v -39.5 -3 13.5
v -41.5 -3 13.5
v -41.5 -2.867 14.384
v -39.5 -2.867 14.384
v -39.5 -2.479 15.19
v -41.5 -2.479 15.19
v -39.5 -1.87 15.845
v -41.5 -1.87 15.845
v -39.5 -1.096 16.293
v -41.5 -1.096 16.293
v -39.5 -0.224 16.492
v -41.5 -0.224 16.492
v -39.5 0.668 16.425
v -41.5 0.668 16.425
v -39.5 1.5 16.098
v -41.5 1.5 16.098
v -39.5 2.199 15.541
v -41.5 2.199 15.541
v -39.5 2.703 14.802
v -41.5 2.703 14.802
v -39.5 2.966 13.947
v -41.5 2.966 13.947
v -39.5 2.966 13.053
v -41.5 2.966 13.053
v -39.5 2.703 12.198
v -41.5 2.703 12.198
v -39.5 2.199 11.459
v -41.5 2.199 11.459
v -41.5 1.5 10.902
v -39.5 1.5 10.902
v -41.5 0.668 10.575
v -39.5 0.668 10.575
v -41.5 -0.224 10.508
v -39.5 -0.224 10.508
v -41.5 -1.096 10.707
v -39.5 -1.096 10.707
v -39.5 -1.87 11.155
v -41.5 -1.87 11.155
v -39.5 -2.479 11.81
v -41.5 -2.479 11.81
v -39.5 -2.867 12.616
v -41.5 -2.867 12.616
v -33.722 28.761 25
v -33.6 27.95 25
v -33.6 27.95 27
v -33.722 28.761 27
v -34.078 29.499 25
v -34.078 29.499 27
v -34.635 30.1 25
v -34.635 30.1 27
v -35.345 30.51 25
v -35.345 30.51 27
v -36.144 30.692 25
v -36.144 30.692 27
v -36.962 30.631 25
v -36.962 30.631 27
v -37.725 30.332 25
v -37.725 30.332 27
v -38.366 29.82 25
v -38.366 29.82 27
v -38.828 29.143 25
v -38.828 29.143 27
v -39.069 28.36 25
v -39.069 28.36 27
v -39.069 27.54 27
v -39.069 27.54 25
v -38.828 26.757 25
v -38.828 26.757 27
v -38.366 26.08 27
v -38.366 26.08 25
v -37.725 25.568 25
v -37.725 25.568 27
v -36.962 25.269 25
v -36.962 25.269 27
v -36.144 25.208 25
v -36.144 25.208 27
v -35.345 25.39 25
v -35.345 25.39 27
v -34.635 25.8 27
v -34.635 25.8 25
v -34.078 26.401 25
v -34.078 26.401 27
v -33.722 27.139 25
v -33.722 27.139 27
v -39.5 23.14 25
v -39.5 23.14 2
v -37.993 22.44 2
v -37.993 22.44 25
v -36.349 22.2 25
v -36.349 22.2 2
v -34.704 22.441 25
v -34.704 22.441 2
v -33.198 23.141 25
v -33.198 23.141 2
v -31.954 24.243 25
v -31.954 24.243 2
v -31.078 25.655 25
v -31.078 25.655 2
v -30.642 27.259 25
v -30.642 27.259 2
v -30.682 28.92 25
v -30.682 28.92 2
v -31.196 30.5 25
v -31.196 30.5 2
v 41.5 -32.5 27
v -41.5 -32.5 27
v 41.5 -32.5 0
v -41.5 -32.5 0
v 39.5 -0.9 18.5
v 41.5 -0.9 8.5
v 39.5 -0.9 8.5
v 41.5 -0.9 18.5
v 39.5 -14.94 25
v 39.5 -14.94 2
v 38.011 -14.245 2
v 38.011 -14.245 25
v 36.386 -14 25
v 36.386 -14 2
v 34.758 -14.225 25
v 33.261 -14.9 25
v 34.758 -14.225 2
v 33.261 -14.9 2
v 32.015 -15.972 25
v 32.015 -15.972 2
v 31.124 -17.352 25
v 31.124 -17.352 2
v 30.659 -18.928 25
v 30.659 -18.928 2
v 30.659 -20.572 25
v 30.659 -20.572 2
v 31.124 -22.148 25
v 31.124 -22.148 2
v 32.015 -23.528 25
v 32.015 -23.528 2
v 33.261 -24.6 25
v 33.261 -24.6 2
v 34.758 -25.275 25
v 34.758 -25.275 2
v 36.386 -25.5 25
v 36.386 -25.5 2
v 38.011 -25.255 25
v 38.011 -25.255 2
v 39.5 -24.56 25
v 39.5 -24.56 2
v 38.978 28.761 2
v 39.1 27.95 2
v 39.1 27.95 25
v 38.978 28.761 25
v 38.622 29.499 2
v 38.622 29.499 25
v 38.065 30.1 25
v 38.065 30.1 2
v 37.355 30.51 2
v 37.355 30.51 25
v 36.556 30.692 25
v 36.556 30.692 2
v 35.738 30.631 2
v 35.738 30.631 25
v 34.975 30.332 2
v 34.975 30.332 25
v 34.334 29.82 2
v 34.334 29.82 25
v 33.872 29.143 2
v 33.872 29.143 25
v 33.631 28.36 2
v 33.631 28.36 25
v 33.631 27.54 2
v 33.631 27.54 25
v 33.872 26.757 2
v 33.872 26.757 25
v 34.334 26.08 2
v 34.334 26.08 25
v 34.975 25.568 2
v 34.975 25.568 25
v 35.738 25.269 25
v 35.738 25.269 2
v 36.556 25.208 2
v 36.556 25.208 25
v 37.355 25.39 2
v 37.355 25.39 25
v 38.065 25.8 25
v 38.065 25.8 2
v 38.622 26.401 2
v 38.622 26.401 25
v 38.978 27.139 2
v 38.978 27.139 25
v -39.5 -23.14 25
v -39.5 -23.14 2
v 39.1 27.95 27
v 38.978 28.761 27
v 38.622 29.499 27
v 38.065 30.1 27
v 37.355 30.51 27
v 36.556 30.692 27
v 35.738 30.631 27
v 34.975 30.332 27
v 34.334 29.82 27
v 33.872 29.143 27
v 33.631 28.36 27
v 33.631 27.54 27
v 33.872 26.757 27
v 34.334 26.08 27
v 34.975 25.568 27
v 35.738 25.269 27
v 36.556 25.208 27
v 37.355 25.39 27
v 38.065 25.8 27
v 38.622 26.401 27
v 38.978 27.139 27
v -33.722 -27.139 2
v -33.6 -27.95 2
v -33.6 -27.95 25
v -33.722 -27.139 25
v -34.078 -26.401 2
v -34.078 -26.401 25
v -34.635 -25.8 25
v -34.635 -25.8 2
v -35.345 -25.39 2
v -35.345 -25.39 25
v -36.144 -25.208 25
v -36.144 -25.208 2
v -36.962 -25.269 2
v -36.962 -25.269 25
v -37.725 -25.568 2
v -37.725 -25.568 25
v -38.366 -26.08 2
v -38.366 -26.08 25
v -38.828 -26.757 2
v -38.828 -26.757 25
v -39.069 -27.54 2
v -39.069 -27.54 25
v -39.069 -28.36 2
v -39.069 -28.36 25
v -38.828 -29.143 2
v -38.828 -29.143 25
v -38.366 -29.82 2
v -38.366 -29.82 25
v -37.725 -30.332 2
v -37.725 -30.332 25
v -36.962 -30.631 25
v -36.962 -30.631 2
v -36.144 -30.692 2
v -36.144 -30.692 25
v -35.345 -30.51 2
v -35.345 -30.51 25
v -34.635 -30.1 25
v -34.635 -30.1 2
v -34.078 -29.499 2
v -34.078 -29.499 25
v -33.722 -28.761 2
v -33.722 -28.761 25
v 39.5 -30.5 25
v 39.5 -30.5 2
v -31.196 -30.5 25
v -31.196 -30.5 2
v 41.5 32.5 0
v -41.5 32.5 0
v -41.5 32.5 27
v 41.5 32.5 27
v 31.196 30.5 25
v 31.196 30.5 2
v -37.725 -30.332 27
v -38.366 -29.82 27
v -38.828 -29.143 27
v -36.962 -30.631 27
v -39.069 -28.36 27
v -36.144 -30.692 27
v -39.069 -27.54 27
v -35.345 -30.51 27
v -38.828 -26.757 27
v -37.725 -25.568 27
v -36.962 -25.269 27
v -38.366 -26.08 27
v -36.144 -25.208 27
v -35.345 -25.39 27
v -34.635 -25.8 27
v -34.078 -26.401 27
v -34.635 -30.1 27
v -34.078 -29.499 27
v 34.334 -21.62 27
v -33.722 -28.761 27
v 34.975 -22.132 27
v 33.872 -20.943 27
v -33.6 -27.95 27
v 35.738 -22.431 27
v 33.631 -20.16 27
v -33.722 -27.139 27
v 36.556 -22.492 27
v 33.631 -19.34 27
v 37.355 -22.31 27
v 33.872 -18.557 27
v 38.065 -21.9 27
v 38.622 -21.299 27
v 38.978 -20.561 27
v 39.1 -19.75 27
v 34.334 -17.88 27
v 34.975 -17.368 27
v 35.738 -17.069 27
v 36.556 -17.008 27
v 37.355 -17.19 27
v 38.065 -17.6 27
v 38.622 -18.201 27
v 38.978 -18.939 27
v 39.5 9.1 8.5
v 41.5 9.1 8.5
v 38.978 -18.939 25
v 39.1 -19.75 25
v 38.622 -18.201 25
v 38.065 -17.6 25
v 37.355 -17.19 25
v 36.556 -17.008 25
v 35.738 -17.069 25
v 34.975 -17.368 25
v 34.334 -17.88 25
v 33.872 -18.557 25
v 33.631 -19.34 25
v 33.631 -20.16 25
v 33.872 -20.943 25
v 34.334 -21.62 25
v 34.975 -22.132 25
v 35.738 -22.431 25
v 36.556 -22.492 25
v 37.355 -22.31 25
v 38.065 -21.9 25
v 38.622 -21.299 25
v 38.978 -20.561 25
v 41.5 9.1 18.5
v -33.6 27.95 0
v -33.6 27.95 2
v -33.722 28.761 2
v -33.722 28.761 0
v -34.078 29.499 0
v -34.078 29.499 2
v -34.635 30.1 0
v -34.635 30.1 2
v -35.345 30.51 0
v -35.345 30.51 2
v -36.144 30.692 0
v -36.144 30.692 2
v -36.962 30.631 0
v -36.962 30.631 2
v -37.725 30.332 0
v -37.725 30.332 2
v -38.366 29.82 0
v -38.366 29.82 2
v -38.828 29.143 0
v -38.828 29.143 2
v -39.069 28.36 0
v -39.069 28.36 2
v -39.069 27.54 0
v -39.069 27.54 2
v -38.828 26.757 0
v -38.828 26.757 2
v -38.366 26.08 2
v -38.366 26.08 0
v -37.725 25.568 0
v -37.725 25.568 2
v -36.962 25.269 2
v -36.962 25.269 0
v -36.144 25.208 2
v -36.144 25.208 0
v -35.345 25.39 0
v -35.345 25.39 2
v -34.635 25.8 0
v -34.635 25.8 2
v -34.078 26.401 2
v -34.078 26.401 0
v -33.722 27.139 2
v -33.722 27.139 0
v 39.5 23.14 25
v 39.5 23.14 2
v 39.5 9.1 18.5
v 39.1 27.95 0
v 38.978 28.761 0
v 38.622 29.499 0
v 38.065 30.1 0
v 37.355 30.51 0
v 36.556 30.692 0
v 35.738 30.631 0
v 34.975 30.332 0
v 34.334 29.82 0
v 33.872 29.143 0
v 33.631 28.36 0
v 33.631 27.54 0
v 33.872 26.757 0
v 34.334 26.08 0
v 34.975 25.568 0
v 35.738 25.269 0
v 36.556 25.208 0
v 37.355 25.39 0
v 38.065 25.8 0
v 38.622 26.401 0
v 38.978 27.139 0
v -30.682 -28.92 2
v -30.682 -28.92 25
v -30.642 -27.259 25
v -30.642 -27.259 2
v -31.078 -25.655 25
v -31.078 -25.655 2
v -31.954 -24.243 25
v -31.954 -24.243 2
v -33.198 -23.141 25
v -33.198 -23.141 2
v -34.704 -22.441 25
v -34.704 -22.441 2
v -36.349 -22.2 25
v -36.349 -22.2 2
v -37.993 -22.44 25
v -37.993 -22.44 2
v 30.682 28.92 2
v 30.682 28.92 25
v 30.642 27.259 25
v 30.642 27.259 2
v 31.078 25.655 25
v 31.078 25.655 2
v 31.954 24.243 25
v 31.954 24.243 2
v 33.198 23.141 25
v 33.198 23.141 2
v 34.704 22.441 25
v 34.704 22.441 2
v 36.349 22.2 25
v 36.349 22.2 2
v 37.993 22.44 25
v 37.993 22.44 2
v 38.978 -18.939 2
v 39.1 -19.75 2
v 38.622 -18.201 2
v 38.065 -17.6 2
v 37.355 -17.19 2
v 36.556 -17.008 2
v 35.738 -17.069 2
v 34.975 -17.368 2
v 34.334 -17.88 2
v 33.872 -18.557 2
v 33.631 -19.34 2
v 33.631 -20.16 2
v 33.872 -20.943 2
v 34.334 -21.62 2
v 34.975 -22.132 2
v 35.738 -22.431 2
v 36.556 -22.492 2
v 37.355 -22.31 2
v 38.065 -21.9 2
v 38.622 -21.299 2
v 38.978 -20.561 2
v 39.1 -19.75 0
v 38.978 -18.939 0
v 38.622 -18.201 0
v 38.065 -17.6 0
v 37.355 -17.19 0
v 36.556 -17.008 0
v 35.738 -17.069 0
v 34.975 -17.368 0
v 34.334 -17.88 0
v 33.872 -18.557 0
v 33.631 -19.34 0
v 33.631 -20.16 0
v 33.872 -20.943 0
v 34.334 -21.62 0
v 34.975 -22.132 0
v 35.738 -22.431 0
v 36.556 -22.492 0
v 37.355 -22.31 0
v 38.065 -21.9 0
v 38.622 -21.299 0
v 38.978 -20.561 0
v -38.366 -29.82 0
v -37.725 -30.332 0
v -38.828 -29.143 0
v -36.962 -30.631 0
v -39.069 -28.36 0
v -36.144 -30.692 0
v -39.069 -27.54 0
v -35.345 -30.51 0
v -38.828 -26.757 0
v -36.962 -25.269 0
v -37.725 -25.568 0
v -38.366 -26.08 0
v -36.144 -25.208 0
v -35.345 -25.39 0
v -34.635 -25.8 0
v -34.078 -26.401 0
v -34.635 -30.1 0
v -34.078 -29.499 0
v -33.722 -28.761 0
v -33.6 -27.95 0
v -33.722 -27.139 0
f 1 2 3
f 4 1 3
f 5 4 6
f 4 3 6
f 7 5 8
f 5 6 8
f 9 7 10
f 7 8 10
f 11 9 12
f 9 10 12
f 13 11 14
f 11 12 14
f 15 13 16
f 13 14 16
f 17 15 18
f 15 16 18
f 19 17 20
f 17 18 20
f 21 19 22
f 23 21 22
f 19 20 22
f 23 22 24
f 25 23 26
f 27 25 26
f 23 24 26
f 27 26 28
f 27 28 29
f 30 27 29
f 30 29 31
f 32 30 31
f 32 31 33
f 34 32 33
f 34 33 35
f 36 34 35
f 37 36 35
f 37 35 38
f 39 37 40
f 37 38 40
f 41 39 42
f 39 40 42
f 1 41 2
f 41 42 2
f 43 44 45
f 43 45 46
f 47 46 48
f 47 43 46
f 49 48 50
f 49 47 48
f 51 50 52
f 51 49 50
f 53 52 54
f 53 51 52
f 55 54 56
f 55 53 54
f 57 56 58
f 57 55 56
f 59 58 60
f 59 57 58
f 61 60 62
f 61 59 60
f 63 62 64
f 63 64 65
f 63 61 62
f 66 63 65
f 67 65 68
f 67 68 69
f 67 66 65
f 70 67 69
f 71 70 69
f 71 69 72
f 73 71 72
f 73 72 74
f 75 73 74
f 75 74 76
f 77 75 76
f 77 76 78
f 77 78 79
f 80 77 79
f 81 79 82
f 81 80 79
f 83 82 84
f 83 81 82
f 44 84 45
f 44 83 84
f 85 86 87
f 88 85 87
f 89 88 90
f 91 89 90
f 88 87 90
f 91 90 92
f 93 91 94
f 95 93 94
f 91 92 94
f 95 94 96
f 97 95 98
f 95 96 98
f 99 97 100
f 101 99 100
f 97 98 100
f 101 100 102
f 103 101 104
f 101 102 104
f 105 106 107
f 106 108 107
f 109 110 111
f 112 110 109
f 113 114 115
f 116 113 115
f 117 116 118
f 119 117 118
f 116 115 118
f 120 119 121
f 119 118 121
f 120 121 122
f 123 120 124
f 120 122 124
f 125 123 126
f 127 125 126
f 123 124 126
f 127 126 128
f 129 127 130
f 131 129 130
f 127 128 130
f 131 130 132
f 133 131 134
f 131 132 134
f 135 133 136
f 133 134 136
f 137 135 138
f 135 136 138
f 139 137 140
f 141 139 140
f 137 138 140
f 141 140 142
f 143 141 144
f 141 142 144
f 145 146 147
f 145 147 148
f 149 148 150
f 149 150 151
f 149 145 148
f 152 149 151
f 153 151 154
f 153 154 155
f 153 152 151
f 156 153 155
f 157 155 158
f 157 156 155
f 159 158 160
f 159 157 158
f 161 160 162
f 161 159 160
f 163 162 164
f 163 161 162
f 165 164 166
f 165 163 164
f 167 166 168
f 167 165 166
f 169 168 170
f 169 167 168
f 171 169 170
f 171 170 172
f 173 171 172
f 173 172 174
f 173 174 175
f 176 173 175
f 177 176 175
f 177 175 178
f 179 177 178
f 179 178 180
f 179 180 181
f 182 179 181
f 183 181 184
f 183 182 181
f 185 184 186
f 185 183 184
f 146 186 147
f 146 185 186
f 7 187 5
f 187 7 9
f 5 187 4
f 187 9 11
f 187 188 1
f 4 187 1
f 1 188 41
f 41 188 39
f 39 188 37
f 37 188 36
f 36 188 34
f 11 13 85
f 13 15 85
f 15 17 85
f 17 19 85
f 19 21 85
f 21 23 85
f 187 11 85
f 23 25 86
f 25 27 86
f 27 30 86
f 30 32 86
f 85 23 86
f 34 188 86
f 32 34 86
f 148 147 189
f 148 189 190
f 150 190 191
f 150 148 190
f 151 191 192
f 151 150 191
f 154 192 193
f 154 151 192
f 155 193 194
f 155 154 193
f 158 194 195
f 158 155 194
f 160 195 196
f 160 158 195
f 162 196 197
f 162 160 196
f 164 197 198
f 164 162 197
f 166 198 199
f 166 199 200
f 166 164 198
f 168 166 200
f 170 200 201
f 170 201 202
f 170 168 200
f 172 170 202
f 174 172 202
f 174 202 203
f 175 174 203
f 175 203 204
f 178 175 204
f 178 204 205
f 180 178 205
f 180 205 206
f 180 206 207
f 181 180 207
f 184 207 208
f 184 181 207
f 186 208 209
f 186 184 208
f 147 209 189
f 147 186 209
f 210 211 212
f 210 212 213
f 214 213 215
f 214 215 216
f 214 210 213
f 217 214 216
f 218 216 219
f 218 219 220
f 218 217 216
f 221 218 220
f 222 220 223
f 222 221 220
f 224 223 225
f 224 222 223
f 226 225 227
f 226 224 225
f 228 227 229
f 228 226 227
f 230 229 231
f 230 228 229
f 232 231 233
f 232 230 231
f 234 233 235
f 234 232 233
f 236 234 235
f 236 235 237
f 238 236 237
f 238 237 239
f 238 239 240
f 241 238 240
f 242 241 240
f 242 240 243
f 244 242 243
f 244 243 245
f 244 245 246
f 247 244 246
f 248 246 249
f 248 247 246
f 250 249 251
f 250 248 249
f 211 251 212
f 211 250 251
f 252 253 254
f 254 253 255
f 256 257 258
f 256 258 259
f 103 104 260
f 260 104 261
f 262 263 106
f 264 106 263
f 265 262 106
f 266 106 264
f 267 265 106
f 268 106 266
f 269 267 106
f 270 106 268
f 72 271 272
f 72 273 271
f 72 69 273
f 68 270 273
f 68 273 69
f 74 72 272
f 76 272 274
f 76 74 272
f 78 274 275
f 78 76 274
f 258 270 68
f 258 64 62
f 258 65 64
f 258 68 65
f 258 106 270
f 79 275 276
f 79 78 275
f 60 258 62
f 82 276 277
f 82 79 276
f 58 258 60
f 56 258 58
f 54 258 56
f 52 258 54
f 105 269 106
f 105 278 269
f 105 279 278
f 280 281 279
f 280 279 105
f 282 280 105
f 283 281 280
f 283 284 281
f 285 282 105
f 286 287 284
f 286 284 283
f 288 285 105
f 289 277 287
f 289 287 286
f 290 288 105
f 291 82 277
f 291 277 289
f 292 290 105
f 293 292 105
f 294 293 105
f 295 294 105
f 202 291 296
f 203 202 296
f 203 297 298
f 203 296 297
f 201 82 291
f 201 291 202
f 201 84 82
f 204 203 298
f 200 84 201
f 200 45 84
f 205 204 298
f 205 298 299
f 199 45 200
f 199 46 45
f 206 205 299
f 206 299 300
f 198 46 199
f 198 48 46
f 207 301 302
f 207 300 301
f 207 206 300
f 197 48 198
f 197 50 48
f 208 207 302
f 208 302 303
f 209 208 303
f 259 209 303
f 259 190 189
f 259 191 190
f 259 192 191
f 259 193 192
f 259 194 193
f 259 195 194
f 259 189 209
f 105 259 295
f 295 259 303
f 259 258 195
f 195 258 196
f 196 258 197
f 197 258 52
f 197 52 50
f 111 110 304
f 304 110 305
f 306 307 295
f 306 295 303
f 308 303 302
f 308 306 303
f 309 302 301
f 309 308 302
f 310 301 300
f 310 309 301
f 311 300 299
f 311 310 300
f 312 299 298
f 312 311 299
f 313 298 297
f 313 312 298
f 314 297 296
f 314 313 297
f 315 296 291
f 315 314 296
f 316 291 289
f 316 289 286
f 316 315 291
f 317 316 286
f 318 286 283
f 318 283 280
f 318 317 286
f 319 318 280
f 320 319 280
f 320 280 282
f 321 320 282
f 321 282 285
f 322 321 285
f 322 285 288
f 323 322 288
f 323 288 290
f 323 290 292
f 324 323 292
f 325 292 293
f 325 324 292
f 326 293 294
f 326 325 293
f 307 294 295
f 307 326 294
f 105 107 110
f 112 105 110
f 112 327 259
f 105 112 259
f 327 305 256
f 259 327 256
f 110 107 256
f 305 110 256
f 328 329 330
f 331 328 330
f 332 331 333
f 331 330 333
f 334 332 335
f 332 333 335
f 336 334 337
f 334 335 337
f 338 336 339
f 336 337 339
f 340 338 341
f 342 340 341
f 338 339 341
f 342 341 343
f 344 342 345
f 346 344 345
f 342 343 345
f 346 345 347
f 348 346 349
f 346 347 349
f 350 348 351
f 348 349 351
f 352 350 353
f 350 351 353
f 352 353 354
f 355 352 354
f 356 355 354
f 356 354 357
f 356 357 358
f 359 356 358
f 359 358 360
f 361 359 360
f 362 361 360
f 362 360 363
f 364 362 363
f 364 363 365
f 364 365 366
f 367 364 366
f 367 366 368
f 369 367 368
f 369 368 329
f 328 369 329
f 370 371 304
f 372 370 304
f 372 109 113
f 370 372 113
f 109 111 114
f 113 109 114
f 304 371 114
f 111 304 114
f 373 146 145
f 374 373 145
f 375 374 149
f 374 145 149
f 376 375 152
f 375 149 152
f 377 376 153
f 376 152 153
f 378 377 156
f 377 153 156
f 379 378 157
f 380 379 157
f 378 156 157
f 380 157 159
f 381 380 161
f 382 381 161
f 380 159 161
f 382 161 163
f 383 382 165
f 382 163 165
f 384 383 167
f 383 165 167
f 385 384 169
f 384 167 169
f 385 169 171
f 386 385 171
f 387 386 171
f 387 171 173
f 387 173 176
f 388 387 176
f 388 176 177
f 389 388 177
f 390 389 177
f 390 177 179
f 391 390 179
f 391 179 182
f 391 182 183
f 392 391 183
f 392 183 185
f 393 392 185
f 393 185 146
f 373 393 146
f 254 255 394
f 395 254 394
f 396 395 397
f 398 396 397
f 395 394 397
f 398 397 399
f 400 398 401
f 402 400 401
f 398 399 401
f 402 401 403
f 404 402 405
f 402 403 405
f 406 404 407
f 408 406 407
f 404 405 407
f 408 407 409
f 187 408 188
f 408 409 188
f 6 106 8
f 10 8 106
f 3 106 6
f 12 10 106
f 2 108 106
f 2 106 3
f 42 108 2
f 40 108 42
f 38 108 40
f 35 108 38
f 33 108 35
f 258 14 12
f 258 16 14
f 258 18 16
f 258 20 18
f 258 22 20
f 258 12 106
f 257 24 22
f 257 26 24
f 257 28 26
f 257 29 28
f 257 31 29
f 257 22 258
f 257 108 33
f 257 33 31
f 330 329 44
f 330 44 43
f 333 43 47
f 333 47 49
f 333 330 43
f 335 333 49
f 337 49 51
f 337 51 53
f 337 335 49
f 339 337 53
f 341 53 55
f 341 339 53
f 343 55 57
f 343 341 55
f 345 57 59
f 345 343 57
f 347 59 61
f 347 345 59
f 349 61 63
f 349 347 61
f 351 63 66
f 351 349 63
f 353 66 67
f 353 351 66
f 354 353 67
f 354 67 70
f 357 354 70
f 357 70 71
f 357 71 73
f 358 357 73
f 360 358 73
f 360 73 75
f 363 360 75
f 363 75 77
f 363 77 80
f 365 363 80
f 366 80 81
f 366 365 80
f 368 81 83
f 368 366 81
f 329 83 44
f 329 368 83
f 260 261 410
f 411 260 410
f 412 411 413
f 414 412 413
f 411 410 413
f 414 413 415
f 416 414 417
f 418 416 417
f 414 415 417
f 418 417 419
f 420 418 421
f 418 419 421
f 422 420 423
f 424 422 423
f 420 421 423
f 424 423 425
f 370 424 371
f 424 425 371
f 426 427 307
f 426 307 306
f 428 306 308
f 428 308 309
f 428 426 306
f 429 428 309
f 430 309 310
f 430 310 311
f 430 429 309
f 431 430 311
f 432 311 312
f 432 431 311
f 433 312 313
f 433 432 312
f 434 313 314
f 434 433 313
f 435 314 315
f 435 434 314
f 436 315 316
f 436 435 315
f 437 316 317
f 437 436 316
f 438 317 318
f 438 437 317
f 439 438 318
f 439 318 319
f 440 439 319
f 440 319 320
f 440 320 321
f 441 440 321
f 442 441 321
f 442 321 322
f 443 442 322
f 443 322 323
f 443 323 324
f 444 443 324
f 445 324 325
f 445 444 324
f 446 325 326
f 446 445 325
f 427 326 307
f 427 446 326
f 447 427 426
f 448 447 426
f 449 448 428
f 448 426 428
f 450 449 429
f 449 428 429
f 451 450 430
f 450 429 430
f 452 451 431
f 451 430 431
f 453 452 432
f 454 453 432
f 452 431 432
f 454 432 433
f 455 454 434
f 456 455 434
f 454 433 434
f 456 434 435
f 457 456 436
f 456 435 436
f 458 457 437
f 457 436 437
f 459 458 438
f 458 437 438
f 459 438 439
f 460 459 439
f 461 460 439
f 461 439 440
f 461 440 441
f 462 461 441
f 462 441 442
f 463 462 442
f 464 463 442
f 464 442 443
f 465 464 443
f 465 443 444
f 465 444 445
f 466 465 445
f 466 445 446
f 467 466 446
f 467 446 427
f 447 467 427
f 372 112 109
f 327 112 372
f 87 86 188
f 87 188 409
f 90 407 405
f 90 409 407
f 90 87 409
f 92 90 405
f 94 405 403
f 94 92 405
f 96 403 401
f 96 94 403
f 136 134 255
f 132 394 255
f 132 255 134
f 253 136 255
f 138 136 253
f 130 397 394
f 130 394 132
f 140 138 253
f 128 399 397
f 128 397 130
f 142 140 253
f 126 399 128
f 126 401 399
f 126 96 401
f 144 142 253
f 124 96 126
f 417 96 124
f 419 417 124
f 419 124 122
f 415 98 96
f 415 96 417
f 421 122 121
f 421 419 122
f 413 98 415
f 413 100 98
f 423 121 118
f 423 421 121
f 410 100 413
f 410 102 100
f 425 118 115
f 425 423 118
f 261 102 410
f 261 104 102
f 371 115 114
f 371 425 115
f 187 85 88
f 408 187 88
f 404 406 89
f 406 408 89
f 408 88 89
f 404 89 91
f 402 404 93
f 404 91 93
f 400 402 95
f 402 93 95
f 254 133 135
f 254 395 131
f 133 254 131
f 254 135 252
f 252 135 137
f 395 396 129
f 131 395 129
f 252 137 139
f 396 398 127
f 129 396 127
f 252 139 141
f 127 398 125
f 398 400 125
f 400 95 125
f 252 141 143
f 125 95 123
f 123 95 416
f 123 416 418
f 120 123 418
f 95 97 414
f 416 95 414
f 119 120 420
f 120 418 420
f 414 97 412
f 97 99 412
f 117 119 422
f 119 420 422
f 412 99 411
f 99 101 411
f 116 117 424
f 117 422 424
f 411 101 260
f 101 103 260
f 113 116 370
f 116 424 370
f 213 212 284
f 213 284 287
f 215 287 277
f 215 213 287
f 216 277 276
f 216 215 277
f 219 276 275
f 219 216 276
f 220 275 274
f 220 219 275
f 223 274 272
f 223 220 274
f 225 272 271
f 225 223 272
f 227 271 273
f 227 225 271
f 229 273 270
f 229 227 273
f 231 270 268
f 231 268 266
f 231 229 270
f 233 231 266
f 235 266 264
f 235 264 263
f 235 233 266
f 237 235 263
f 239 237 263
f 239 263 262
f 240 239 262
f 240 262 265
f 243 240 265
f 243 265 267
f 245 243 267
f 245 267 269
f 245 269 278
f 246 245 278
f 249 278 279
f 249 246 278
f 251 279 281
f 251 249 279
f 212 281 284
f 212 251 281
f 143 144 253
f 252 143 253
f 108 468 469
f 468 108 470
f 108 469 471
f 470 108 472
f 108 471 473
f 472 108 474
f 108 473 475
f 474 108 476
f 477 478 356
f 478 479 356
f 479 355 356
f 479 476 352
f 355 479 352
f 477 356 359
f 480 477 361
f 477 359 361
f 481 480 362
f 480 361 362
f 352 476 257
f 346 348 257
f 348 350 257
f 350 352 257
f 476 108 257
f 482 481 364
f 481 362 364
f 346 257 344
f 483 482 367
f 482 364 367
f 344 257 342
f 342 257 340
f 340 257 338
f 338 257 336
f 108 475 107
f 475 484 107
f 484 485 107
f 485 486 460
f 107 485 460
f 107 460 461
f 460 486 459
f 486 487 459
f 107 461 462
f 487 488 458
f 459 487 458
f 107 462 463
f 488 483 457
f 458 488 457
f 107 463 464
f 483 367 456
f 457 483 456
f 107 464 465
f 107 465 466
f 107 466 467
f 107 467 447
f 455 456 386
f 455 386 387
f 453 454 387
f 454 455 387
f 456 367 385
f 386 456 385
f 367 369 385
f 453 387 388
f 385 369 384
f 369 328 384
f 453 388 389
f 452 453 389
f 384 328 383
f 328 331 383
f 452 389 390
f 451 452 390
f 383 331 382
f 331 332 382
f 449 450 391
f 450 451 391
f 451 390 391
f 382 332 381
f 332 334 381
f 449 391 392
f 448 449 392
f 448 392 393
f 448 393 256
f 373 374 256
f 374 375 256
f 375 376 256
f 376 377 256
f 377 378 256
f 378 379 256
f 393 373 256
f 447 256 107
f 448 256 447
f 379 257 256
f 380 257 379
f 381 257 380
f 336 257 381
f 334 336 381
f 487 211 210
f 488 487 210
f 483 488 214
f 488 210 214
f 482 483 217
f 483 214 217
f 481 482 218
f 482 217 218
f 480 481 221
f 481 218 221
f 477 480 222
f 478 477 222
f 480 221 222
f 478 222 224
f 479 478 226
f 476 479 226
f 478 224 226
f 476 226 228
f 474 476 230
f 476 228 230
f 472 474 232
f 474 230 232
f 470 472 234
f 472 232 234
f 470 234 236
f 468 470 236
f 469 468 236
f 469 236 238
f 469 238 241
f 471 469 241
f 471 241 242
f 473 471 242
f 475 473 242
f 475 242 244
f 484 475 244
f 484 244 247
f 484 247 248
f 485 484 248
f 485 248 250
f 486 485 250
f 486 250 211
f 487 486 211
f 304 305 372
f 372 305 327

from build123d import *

# Parameters (mm, degrees)
F0_W      = 83
F0_H      = 65
F1_DEPTH  = 2
F2_W      = 83
F2_H      = 65
F2_R      = 2.75
F3_DEPTH  = 23
F4_R      = 2.75
F5_DEPTH  = 2.001
F6_W      = 83
F6_H      = 65
F6_R      = 2.75
F7_DEPTH  = 2
F8_W      = 10
F8_H      = 10
F9_DEPTH  = 2
F10_R     = 3
F11_DEPTH = 2


with BuildPart() as f1:
    # F0 (on Top) → F1 (new body)
    with BuildSketch(Plane.XY):
        Rectangle(F0_W, F0_H)
    extrude(amount=F1_DEPTH)

    # F2 (on face) → F3 (join)
    with BuildSketch(Plane.XY.offset(2)):
        Rectangle(F2_W, F2_H)
        with Locations((-36.35, -27.95)):
            Circle(F2_R, mode=Mode.SUBTRACT)
        with Locations((36.35, -19.75)):
            Circle(F2_R, mode=Mode.SUBTRACT)
        with Locations((-36.35, 27.95)):
            Circle(F2_R, mode=Mode.SUBTRACT)
        with BuildLine():
            Line((39.5, -30.5), (-31.196361, -30.5))
            ThreePointArc((-31.196361, -30.5), (-32.535877, -23.647098), (-39.5, -23.139595))
            Line((-39.5, -23.139595), (-39.5, 23.139595))
            ThreePointArc((-39.5, 23.139595), (-32.535877, 23.647098), (-31.196361, 30.5))
            Line((-31.196361, 30.5), (31.196361, 30.5))
            ThreePointArc((31.196361, 30.5), (32.535877, 23.647098), (39.5, 23.139595))
            Line((39.5, 23.139595), (39.5, -14.939595))
            ThreePointArc((39.5, -14.939595), (30.6, -19.75), (39.5, -24.560405))
            Line((39.5, -24.560405), (39.5, -30.5))
        make_face(mode=Mode.SUBTRACT)
        with Locations((36.35, 27.95)):
            Circle(F2_R, mode=Mode.SUBTRACT)
    extrude(amount=F3_DEPTH)

    # F4 (on face) → F5 (cut, through all)
    with BuildSketch(Plane.XY.offset(2)):
        with Locations((-36.35, 27.95)):
            Circle(F4_R)
        with Locations((-36.35, -27.95)):
            Circle(F4_R)
        with Locations((36.35, 27.95)):
            Circle(F4_R)
        with Locations((36.35, -19.75)):
            Circle(F4_R)
    extrude(amount=-F5_DEPTH, mode=Mode.SUBTRACT)

    # F6 (on face) → F7 (join)
    with BuildSketch(Plane.XY.offset(25)):
        Rectangle(F6_W, F6_H)
        with Locations((-36.35, -27.95)):
            Circle(F6_R, mode=Mode.SUBTRACT)
        with Locations((36.35, -19.75)):
            Circle(F6_R, mode=Mode.SUBTRACT)
        with Locations((-36.35, 27.95)):
            Circle(F6_R, mode=Mode.SUBTRACT)
        with Locations((36.35, 27.95)):
            Circle(F6_R, mode=Mode.SUBTRACT)
    extrude(amount=F7_DEPTH)

    # F8 (on face) → F9 (cut)
    with BuildSketch(Plane.YZ.offset(41.5)):
        with Locations((4.1, 13.5)):
            Rectangle(F8_W, F8_H)
    extrude(amount=-F9_DEPTH, mode=Mode.SUBTRACT)

    # F10 (on face) → F11 (cut)
    with BuildSketch(Plane(origin=(-41.5, 0, 0), x_dir=(0, -1, 0), z_dir=(-1, 0, 0))):
        with Locations((0, 13.5)):
            Circle(F10_R)
    extrude(amount=-F11_DEPTH, mode=Mode.SUBTRACT)


solid = f1.part
